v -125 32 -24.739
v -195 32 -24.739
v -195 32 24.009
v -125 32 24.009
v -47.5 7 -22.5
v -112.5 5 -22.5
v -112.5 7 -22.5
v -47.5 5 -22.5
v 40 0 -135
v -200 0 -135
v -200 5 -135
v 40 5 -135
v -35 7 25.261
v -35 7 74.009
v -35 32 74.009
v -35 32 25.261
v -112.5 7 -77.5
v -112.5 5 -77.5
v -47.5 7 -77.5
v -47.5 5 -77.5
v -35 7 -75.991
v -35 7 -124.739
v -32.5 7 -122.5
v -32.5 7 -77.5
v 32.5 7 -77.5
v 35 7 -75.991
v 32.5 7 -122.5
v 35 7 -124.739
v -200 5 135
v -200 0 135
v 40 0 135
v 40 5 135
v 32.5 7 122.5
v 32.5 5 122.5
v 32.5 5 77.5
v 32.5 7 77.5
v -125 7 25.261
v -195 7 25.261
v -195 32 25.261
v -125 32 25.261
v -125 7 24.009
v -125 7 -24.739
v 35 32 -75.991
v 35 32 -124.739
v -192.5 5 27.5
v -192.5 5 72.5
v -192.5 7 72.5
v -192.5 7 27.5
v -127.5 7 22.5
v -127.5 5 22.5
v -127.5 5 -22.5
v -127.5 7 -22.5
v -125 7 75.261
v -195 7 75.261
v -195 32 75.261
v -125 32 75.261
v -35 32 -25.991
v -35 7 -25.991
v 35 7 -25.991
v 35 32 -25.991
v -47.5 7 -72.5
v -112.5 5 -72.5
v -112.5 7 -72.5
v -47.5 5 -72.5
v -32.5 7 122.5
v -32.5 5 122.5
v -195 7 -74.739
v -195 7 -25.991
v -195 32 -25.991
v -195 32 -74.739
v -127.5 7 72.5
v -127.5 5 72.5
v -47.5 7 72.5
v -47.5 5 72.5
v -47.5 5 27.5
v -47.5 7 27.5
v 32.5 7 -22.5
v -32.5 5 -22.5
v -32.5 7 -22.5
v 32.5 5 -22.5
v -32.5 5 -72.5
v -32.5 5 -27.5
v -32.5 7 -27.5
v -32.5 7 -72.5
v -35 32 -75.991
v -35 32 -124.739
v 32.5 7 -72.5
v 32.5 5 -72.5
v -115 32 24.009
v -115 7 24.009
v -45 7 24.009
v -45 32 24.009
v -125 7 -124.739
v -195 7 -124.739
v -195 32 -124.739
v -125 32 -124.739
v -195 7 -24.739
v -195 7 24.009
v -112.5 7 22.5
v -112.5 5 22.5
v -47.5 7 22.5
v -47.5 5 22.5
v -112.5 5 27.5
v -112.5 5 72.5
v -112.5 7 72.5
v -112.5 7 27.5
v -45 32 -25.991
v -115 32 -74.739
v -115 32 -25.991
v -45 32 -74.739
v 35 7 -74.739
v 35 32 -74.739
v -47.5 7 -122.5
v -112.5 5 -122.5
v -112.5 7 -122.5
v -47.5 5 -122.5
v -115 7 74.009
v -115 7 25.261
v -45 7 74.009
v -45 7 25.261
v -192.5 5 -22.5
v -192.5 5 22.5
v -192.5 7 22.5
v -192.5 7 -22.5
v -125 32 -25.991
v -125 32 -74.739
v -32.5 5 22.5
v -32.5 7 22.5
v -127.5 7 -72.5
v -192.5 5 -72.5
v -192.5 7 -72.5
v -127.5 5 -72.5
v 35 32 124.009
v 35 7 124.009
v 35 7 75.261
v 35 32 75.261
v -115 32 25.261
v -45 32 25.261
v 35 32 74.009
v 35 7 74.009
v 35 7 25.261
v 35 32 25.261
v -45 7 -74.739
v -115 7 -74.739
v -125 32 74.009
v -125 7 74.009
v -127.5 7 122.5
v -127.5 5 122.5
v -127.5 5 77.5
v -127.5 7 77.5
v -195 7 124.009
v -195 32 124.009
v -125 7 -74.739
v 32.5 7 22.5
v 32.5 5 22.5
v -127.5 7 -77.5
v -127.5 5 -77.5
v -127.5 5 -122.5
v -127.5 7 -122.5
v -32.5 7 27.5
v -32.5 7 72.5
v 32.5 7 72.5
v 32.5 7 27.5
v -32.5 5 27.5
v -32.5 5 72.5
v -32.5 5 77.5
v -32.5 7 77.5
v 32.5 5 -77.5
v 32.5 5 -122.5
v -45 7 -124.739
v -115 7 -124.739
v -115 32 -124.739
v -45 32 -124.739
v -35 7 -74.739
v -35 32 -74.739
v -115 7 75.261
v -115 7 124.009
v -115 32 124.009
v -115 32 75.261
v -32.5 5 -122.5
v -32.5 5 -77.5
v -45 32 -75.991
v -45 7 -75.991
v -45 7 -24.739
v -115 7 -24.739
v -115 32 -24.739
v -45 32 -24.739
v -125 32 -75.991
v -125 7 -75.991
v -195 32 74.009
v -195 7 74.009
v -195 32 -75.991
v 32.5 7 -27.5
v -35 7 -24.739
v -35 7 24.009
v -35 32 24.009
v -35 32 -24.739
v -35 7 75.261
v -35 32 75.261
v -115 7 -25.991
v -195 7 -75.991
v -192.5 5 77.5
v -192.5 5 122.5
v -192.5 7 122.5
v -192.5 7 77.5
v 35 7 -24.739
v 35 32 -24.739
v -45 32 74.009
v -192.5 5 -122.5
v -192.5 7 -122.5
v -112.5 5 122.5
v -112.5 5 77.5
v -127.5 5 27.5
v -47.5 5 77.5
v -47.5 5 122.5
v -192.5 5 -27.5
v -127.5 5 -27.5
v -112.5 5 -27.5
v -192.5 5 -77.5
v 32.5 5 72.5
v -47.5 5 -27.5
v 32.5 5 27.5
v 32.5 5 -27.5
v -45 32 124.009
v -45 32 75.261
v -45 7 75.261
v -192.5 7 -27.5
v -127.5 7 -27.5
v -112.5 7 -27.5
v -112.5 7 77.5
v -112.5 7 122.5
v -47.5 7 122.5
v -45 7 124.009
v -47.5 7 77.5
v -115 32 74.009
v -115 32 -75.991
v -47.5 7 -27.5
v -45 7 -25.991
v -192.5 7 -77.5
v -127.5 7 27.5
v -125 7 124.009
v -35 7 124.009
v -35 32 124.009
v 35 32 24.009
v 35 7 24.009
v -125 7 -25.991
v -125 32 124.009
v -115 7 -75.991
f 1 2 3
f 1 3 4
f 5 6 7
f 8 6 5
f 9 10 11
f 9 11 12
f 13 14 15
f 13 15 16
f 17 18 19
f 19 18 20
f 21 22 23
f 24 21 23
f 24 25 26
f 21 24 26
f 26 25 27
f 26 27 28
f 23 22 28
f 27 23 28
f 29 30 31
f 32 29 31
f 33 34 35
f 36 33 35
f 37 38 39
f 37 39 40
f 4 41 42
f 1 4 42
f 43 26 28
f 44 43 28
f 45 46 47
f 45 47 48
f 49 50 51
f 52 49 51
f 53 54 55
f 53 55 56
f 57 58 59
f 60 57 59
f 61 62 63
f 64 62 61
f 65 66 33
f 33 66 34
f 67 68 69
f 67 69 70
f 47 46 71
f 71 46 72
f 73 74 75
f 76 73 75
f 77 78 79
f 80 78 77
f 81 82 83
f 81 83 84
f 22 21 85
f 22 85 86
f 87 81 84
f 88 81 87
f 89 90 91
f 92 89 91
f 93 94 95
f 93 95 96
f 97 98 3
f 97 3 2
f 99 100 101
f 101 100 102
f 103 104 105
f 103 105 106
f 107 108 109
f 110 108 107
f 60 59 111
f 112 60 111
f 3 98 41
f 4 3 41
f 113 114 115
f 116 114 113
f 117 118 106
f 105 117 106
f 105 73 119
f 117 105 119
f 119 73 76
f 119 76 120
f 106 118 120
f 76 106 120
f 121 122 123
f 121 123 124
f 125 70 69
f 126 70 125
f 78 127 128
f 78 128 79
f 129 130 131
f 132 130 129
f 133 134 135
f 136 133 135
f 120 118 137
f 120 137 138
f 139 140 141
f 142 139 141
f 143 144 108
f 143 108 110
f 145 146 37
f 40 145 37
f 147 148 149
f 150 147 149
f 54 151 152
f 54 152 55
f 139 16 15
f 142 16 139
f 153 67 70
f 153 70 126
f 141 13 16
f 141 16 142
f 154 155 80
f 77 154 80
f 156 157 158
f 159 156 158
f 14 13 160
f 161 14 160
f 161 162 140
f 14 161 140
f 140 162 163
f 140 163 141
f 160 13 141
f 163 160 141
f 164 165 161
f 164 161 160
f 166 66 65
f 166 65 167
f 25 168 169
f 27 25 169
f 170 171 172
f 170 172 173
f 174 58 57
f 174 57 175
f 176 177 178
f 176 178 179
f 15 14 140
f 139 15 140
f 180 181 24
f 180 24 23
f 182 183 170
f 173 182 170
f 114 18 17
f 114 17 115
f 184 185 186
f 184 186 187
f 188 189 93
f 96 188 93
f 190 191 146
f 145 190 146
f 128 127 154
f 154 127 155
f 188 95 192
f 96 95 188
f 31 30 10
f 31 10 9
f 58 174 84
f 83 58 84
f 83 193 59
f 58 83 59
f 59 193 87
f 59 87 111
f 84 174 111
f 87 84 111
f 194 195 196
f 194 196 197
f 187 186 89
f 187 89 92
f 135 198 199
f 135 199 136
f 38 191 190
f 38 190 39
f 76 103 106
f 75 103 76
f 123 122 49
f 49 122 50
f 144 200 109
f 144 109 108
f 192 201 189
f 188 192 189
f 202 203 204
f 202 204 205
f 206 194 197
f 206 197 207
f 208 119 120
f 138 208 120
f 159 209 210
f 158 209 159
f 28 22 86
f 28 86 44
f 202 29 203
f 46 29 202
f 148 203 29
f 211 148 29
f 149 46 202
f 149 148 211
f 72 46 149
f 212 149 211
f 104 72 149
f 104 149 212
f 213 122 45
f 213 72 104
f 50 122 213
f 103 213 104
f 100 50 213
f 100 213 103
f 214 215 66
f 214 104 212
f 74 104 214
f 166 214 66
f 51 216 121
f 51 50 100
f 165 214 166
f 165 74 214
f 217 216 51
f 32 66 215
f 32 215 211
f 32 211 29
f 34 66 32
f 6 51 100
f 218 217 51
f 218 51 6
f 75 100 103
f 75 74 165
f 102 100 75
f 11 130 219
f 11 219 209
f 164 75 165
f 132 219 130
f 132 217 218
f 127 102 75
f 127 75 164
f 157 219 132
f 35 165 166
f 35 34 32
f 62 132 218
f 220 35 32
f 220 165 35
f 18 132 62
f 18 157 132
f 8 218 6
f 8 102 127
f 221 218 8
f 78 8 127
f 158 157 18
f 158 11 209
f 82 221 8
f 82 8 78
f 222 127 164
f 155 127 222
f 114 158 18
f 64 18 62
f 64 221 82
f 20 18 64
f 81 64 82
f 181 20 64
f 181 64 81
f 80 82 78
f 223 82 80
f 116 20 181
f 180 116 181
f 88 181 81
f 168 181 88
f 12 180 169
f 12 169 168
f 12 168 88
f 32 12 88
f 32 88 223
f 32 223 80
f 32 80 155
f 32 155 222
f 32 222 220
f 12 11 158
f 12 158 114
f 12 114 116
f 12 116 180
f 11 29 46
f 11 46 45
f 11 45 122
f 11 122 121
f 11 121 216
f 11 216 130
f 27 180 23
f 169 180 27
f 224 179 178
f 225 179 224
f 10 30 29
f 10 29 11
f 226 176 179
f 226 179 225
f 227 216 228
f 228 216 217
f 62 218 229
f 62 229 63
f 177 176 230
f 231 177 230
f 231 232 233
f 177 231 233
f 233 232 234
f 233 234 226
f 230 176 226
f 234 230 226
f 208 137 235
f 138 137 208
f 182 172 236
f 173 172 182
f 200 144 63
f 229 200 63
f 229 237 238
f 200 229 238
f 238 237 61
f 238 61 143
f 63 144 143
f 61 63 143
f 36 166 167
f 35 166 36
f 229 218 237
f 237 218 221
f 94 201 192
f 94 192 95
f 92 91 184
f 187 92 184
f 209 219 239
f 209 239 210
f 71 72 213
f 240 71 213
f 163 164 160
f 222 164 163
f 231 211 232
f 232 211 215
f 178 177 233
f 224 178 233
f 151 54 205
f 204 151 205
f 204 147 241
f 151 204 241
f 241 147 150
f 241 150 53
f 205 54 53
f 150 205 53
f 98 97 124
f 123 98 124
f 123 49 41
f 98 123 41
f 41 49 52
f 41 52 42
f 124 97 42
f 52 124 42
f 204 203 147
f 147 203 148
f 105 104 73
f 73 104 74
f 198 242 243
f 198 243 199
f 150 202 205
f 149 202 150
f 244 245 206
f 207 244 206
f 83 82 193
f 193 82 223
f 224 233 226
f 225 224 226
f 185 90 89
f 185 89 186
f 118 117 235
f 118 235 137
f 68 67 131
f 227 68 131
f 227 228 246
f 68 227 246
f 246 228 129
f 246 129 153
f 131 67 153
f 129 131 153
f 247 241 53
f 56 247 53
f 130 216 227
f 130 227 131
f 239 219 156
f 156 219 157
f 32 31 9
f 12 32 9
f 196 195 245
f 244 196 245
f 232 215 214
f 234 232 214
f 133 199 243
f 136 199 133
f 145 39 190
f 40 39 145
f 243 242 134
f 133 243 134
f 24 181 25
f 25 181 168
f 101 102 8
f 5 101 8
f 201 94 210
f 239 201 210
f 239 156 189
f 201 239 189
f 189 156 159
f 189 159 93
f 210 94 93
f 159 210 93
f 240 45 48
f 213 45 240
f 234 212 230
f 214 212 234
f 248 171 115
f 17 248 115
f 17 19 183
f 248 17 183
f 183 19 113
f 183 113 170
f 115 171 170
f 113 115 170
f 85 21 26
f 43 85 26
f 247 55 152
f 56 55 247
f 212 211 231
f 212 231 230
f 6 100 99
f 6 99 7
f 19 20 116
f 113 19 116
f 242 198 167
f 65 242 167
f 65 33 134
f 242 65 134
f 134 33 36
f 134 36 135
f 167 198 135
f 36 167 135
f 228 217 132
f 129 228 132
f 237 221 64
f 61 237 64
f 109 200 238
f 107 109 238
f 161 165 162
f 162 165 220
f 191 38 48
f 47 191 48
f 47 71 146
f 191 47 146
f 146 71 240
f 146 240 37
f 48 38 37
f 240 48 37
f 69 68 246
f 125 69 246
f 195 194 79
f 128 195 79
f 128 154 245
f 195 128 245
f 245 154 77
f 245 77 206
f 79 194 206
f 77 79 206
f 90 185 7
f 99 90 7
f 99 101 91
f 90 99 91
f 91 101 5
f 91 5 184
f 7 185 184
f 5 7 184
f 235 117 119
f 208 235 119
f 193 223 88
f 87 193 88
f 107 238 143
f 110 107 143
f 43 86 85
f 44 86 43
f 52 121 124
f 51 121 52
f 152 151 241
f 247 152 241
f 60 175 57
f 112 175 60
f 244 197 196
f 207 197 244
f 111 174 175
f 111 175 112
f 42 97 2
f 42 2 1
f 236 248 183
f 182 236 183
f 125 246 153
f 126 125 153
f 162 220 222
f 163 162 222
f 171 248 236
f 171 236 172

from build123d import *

# Parameters (mm, degrees)
SKETCH1_W                  = 80
SKETCH1_H                  = 270
BOSS_EXTRUDE1_DEPTH        = 5
SKETCH2_W                  = 65
SKETCH2_H                  = 45
BOSS_EXTRUDE3_DEPTH        = 2
LPATTERN1_COUNT            = 5
LPATTERN1_PITCH            = 50
SKETCH3_W                  = 70
SKETCH3_H                  = 48.748964222
BOSS_EXTRUDE8_DEPTH        = 25
LPATTERN5_COUNT            = 5
LPATTERN5_PITCH            = 50
LPATTERN6_COUNT            = 3
LPATTERN6_PITCH            = 80
LPATTERN6_COPY_1_SKETCH_W  = 65
LPATTERN6_COPY_1_SKETCH_H  = 45
LPATTERN6_COPY_1_DEPTH     = 2
LPATTERN6_COPY_2_SKETCH_W  = 65
LPATTERN6_COPY_2_SKETCH_H  = 45
LPATTERN6_COPY_2_DEPTH     = 2
LPATTERN6_COPY_3_SKETCH_W  = 65
LPATTERN6_COPY_3_SKETCH_H  = 45
LPATTERN6_COPY_3_DEPTH     = 2
LPATTERN6_COPY_4_SKETCH_W  = 65
LPATTERN6_COPY_4_SKETCH_H  = 45
LPATTERN6_COPY_4_DEPTH     = 2
LPATTERN6_COPY_5_SKETCH_W  = 65
LPATTERN6_COPY_5_SKETCH_H  = 45
LPATTERN6_COPY_5_DEPTH     = 2
LPATTERN6_COPY_6_SKETCH_W  = 65
LPATTERN6_COPY_6_SKETCH_H  = 45
LPATTERN6_COPY_6_DEPTH     = 2
LPATTERN6_COPY_7_SKETCH_W  = 65
LPATTERN6_COPY_7_SKETCH_H  = 45
LPATTERN6_COPY_7_DEPTH     = 2
LPATTERN6_COPY_8_SKETCH_W  = 65
LPATTERN6_COPY_8_SKETCH_H  = 45
LPATTERN6_COPY_8_DEPTH     = 2
LPATTERN6_COPY_9_SKETCH_W  = 70
LPATTERN6_COPY_9_SKETCH_H  = 48.748964222
LPATTERN6_COPY_9_DEPTH     = 25
LPATTERN6_COPY_10_SKETCH_W = 70
LPATTERN6_COPY_10_SKETCH_H = 48.748964222
LPATTERN6_COPY_10_DEPTH    = 25
LPATTERN6_COPY_11_SKETCH_W = 70
LPATTERN6_COPY_11_SKETCH_H = 48.748964222
LPATTERN6_COPY_11_DEPTH    = 25
LPATTERN6_COPY_12_SKETCH_W = 70
LPATTERN6_COPY_12_SKETCH_H = 48.748964222
LPATTERN6_COPY_12_DEPTH    = 25
LPATTERN6_COPY_13_SKETCH_W = 70
LPATTERN6_COPY_13_SKETCH_H = 48.748964222
LPATTERN6_COPY_13_DEPTH    = 25
LPATTERN6_COPY_14_SKETCH_W = 70
LPATTERN6_COPY_14_SKETCH_H = 48.748964222
LPATTERN6_COPY_14_DEPTH    = 25
LPATTERN6_COPY_15_SKETCH_W = 70
LPATTERN6_COPY_15_SKETCH_H = 48.748964222
LPATTERN6_COPY_15_DEPTH    = 25
LPATTERN6_COPY_16_SKETCH_W = 70
LPATTERN6_COPY_16_SKETCH_H = 48.748964222
LPATTERN6_COPY_16_DEPTH    = 25


with BuildPart() as part:
    # Sketch1 → Boss-Extrude1 (new body)
    with BuildSketch(Plane(origin=(0, 0, 0), x_dir=(1, 0, 0), z_dir=(0, 1, 0))):
        Rectangle(SKETCH1_W, SKETCH1_H)
    boss_extrude1 = extrude(amount=BOSS_EXTRUDE1_DEPTH)

    # Sketch2 → Boss-Extrude3 (add)
    with BuildSketch(Plane(origin=(0, 5, 0), x_dir=(1, 0, 0), z_dir=(0, 1, 0))):
        with Locations((0, -100)):
            Rectangle(SKETCH2_W, SKETCH2_H)
    boss_extrude3 = extrude(amount=BOSS_EXTRUDE3_DEPTH)

    # LPattern1: Boss-Extrude3 ×5
    with Locations(*[(0, 0, -i * LPATTERN1_PITCH) for i in range(1, LPATTERN1_COUNT)]):
        add(boss_extrude3)

    # Sketch3 → Boss-Extrude8 (add)
    with BuildSketch(Plane(origin=(0, 7, 0), x_dir=(1, 0, 0), z_dir=(0, 1, 0))):
        with Locations((0, -99.635002086)):
            Rectangle(SKETCH3_W, SKETCH3_H)
    boss_extrude8 = extrude(amount=BOSS_EXTRUDE8_DEPTH)

    # LPattern5: Boss-Extrude8 ×5
    with Locations(*[(0, 0, -i * LPATTERN5_PITCH) for i in range(1, LPATTERN5_COUNT)]):
        add(boss_extrude8)

    # LPattern6: Boss-Extrude1, Boss-Extrude3, Boss-Extrude8 ×3
    with Locations(*[(-i * LPATTERN6_PITCH, 0, 0) for i in range(1, LPATTERN6_COUNT)]):
        add(boss_extrude1)
        add(boss_extrude3)
        add(boss_extrude8)

    # LPattern6 copy 1 sketch → LPattern6 copy 1 (add)
    with BuildSketch(Plane(origin=(-80, 5, -50), x_dir=(1, 0, 0), z_dir=(0, 1, 0))):
        with Locations((0, -100)):
            Rectangle(LPATTERN6_COPY_1_SKETCH_W, LPATTERN6_COPY_1_SKETCH_H)
    extrude(amount=LPATTERN6_COPY_1_DEPTH)

    # LPattern6 copy 2 sketch → LPattern6 copy 2 (add)
    with BuildSketch(Plane(origin=(-160, 5, -50), x_dir=(1, 0, 0), z_dir=(0, 1, 0))):
        with Locations((0, -100)):
            Rectangle(LPATTERN6_COPY_2_SKETCH_W, LPATTERN6_COPY_2_SKETCH_H)
    extrude(amount=LPATTERN6_COPY_2_DEPTH)

    # LPattern6 copy 3 sketch → LPattern6 copy 3 (add)
    with BuildSketch(Plane(origin=(-80, 5, -100), x_dir=(1, 0, 0), z_dir=(0, 1, 0))):
        with Locations((0, -100)):
            Rectangle(LPATTERN6_COPY_3_SKETCH_W, LPATTERN6_COPY_3_SKETCH_H)
    extrude(amount=LPATTERN6_COPY_3_DEPTH)

    # LPattern6 copy 4 sketch → LPattern6 copy 4 (add)
    with BuildSketch(Plane(origin=(-160, 5, -100), x_dir=(1, 0, 0), z_dir=(0, 1, 0))):
        with Locations((0, -100)):
            Rectangle(LPATTERN6_COPY_4_SKETCH_W, LPATTERN6_COPY_4_SKETCH_H)
    extrude(amount=LPATTERN6_COPY_4_DEPTH)

    # LPattern6 copy 5 sketch → LPattern6 copy 5 (add)
    with BuildSketch(Plane(origin=(-80, 5, -150), x_dir=(1, 0, 0), z_dir=(0, 1, 0))):
        with Locations((0, -100)):
            Rectangle(LPATTERN6_COPY_5_SKETCH_W, LPATTERN6_COPY_5_SKETCH_H)
    extrude(amount=LPATTERN6_COPY_5_DEPTH)

    # LPattern6 copy 6 sketch → LPattern6 copy 6 (add)
    with BuildSketch(Plane(origin=(-160, 5, -150), x_dir=(1, 0, 0), z_dir=(0, 1, 0))):
        with Locations((0, -100)):
            Rectangle(LPATTERN6_COPY_6_SKETCH_W, LPATTERN6_COPY_6_SKETCH_H)
    extrude(amount=LPATTERN6_COPY_6_DEPTH)

    # LPattern6 copy 7 sketch → LPattern6 copy 7 (add)
    with BuildSketch(Plane(origin=(-80, 5, -200), x_dir=(1, 0, 0), z_dir=(0, 1, 0))):
        with Locations((0, -100)):
            Rectangle(LPATTERN6_COPY_7_SKETCH_W, LPATTERN6_COPY_7_SKETCH_H)
    extrude(amount=LPATTERN6_COPY_7_DEPTH)

    # LPattern6 copy 8 sketch → LPattern6 copy 8 (add)
    with BuildSketch(Plane(origin=(-160, 5, -200), x_dir=(1, 0, 0), z_dir=(0, 1, 0))):
        with Locations((0, -100)):
            Rectangle(LPATTERN6_COPY_8_SKETCH_W, LPATTERN6_COPY_8_SKETCH_H)
    extrude(amount=LPATTERN6_COPY_8_DEPTH)

    # LPattern6 copy 9 sketch → LPattern6 copy 9 (add)
    with BuildSketch(Plane(origin=(-80, 7, -50), x_dir=(1, 0, 0), z_dir=(0, 1, 0))):
        with Locations((0, -99.635002086)):
            Rectangle(LPATTERN6_COPY_9_SKETCH_W, LPATTERN6_COPY_9_SKETCH_H)
    extrude(amount=LPATTERN6_COPY_9_DEPTH)

    # LPattern6 copy 10 sketch → LPattern6 copy 10 (add)
    with BuildSketch(Plane(origin=(-160, 7, -50), x_dir=(1, 0, 0), z_dir=(0, 1, 0))):
        with Locations((0, -99.635002086)):
            Rectangle(LPATTERN6_COPY_10_SKETCH_W, LPATTERN6_COPY_10_SKETCH_H)
    extrude(amount=LPATTERN6_COPY_10_DEPTH)

    # LPattern6 copy 11 sketch → LPattern6 copy 11 (add)
    with BuildSketch(Plane(origin=(-80, 7, -100), x_dir=(1, 0, 0), z_dir=(0, 1, 0))):
        with Locations((0, -99.635002086)):
            Rectangle(LPATTERN6_COPY_11_SKETCH_W, LPATTERN6_COPY_11_SKETCH_H)
    extrude(amount=LPATTERN6_COPY_11_DEPTH)

    # LPattern6 copy 12 sketch → LPattern6 copy 12 (add)
    with BuildSketch(Plane(origin=(-160, 7, -100), x_dir=(1, 0, 0), z_dir=(0, 1, 0))):
        with Locations((0, -99.635002086)):
            Rectangle(LPATTERN6_COPY_12_SKETCH_W, LPATTERN6_COPY_12_SKETCH_H)
    extrude(amount=LPATTERN6_COPY_12_DEPTH)

    # LPattern6 copy 13 sketch → LPattern6 copy 13 (add)
    with BuildSketch(Plane(origin=(-80, 7, -150), x_dir=(1, 0, 0), z_dir=(0, 1, 0))):
        with Locations((0, -99.635002086)):
            Rectangle(LPATTERN6_COPY_13_SKETCH_W, LPATTERN6_COPY_13_SKETCH_H)
    extrude(amount=LPATTERN6_COPY_13_DEPTH)

    # LPattern6 copy 14 sketch → LPattern6 copy 14 (add)
    with BuildSketch(Plane(origin=(-160, 7, -150), x_dir=(1, 0, 0), z_dir=(0, 1, 0))):
        with Locations((0, -99.635002086)):
            Rectangle(LPATTERN6_COPY_14_SKETCH_W, LPATTERN6_COPY_14_SKETCH_H)
    extrude(amount=LPATTERN6_COPY_14_DEPTH)

    # LPattern6 copy 15 sketch → LPattern6 copy 15 (add)
    with BuildSketch(Plane(origin=(-80, 7, -200), x_dir=(1, 0, 0), z_dir=(0, 1, 0))):
        with Locations((0, -99.635002086)):
            Rectangle(LPATTERN6_COPY_15_SKETCH_W, LPATTERN6_COPY_15_SKETCH_H)
    extrude(amount=LPATTERN6_COPY_15_DEPTH)

    # LPattern6 copy 16 sketch → LPattern6 copy 16 (add)
    with BuildSketch(Plane(origin=(-160, 7, -200), x_dir=(1, 0, 0), z_dir=(0, 1, 0))):
        with Locations((0, -99.635002086)):
            Rectangle(LPATTERN6_COPY_16_SKETCH_W, LPATTERN6_COPY_16_SKETCH_H)
    extrude(amount=LPATTERN6_COPY_16_DEPTH)


solid = part.part
